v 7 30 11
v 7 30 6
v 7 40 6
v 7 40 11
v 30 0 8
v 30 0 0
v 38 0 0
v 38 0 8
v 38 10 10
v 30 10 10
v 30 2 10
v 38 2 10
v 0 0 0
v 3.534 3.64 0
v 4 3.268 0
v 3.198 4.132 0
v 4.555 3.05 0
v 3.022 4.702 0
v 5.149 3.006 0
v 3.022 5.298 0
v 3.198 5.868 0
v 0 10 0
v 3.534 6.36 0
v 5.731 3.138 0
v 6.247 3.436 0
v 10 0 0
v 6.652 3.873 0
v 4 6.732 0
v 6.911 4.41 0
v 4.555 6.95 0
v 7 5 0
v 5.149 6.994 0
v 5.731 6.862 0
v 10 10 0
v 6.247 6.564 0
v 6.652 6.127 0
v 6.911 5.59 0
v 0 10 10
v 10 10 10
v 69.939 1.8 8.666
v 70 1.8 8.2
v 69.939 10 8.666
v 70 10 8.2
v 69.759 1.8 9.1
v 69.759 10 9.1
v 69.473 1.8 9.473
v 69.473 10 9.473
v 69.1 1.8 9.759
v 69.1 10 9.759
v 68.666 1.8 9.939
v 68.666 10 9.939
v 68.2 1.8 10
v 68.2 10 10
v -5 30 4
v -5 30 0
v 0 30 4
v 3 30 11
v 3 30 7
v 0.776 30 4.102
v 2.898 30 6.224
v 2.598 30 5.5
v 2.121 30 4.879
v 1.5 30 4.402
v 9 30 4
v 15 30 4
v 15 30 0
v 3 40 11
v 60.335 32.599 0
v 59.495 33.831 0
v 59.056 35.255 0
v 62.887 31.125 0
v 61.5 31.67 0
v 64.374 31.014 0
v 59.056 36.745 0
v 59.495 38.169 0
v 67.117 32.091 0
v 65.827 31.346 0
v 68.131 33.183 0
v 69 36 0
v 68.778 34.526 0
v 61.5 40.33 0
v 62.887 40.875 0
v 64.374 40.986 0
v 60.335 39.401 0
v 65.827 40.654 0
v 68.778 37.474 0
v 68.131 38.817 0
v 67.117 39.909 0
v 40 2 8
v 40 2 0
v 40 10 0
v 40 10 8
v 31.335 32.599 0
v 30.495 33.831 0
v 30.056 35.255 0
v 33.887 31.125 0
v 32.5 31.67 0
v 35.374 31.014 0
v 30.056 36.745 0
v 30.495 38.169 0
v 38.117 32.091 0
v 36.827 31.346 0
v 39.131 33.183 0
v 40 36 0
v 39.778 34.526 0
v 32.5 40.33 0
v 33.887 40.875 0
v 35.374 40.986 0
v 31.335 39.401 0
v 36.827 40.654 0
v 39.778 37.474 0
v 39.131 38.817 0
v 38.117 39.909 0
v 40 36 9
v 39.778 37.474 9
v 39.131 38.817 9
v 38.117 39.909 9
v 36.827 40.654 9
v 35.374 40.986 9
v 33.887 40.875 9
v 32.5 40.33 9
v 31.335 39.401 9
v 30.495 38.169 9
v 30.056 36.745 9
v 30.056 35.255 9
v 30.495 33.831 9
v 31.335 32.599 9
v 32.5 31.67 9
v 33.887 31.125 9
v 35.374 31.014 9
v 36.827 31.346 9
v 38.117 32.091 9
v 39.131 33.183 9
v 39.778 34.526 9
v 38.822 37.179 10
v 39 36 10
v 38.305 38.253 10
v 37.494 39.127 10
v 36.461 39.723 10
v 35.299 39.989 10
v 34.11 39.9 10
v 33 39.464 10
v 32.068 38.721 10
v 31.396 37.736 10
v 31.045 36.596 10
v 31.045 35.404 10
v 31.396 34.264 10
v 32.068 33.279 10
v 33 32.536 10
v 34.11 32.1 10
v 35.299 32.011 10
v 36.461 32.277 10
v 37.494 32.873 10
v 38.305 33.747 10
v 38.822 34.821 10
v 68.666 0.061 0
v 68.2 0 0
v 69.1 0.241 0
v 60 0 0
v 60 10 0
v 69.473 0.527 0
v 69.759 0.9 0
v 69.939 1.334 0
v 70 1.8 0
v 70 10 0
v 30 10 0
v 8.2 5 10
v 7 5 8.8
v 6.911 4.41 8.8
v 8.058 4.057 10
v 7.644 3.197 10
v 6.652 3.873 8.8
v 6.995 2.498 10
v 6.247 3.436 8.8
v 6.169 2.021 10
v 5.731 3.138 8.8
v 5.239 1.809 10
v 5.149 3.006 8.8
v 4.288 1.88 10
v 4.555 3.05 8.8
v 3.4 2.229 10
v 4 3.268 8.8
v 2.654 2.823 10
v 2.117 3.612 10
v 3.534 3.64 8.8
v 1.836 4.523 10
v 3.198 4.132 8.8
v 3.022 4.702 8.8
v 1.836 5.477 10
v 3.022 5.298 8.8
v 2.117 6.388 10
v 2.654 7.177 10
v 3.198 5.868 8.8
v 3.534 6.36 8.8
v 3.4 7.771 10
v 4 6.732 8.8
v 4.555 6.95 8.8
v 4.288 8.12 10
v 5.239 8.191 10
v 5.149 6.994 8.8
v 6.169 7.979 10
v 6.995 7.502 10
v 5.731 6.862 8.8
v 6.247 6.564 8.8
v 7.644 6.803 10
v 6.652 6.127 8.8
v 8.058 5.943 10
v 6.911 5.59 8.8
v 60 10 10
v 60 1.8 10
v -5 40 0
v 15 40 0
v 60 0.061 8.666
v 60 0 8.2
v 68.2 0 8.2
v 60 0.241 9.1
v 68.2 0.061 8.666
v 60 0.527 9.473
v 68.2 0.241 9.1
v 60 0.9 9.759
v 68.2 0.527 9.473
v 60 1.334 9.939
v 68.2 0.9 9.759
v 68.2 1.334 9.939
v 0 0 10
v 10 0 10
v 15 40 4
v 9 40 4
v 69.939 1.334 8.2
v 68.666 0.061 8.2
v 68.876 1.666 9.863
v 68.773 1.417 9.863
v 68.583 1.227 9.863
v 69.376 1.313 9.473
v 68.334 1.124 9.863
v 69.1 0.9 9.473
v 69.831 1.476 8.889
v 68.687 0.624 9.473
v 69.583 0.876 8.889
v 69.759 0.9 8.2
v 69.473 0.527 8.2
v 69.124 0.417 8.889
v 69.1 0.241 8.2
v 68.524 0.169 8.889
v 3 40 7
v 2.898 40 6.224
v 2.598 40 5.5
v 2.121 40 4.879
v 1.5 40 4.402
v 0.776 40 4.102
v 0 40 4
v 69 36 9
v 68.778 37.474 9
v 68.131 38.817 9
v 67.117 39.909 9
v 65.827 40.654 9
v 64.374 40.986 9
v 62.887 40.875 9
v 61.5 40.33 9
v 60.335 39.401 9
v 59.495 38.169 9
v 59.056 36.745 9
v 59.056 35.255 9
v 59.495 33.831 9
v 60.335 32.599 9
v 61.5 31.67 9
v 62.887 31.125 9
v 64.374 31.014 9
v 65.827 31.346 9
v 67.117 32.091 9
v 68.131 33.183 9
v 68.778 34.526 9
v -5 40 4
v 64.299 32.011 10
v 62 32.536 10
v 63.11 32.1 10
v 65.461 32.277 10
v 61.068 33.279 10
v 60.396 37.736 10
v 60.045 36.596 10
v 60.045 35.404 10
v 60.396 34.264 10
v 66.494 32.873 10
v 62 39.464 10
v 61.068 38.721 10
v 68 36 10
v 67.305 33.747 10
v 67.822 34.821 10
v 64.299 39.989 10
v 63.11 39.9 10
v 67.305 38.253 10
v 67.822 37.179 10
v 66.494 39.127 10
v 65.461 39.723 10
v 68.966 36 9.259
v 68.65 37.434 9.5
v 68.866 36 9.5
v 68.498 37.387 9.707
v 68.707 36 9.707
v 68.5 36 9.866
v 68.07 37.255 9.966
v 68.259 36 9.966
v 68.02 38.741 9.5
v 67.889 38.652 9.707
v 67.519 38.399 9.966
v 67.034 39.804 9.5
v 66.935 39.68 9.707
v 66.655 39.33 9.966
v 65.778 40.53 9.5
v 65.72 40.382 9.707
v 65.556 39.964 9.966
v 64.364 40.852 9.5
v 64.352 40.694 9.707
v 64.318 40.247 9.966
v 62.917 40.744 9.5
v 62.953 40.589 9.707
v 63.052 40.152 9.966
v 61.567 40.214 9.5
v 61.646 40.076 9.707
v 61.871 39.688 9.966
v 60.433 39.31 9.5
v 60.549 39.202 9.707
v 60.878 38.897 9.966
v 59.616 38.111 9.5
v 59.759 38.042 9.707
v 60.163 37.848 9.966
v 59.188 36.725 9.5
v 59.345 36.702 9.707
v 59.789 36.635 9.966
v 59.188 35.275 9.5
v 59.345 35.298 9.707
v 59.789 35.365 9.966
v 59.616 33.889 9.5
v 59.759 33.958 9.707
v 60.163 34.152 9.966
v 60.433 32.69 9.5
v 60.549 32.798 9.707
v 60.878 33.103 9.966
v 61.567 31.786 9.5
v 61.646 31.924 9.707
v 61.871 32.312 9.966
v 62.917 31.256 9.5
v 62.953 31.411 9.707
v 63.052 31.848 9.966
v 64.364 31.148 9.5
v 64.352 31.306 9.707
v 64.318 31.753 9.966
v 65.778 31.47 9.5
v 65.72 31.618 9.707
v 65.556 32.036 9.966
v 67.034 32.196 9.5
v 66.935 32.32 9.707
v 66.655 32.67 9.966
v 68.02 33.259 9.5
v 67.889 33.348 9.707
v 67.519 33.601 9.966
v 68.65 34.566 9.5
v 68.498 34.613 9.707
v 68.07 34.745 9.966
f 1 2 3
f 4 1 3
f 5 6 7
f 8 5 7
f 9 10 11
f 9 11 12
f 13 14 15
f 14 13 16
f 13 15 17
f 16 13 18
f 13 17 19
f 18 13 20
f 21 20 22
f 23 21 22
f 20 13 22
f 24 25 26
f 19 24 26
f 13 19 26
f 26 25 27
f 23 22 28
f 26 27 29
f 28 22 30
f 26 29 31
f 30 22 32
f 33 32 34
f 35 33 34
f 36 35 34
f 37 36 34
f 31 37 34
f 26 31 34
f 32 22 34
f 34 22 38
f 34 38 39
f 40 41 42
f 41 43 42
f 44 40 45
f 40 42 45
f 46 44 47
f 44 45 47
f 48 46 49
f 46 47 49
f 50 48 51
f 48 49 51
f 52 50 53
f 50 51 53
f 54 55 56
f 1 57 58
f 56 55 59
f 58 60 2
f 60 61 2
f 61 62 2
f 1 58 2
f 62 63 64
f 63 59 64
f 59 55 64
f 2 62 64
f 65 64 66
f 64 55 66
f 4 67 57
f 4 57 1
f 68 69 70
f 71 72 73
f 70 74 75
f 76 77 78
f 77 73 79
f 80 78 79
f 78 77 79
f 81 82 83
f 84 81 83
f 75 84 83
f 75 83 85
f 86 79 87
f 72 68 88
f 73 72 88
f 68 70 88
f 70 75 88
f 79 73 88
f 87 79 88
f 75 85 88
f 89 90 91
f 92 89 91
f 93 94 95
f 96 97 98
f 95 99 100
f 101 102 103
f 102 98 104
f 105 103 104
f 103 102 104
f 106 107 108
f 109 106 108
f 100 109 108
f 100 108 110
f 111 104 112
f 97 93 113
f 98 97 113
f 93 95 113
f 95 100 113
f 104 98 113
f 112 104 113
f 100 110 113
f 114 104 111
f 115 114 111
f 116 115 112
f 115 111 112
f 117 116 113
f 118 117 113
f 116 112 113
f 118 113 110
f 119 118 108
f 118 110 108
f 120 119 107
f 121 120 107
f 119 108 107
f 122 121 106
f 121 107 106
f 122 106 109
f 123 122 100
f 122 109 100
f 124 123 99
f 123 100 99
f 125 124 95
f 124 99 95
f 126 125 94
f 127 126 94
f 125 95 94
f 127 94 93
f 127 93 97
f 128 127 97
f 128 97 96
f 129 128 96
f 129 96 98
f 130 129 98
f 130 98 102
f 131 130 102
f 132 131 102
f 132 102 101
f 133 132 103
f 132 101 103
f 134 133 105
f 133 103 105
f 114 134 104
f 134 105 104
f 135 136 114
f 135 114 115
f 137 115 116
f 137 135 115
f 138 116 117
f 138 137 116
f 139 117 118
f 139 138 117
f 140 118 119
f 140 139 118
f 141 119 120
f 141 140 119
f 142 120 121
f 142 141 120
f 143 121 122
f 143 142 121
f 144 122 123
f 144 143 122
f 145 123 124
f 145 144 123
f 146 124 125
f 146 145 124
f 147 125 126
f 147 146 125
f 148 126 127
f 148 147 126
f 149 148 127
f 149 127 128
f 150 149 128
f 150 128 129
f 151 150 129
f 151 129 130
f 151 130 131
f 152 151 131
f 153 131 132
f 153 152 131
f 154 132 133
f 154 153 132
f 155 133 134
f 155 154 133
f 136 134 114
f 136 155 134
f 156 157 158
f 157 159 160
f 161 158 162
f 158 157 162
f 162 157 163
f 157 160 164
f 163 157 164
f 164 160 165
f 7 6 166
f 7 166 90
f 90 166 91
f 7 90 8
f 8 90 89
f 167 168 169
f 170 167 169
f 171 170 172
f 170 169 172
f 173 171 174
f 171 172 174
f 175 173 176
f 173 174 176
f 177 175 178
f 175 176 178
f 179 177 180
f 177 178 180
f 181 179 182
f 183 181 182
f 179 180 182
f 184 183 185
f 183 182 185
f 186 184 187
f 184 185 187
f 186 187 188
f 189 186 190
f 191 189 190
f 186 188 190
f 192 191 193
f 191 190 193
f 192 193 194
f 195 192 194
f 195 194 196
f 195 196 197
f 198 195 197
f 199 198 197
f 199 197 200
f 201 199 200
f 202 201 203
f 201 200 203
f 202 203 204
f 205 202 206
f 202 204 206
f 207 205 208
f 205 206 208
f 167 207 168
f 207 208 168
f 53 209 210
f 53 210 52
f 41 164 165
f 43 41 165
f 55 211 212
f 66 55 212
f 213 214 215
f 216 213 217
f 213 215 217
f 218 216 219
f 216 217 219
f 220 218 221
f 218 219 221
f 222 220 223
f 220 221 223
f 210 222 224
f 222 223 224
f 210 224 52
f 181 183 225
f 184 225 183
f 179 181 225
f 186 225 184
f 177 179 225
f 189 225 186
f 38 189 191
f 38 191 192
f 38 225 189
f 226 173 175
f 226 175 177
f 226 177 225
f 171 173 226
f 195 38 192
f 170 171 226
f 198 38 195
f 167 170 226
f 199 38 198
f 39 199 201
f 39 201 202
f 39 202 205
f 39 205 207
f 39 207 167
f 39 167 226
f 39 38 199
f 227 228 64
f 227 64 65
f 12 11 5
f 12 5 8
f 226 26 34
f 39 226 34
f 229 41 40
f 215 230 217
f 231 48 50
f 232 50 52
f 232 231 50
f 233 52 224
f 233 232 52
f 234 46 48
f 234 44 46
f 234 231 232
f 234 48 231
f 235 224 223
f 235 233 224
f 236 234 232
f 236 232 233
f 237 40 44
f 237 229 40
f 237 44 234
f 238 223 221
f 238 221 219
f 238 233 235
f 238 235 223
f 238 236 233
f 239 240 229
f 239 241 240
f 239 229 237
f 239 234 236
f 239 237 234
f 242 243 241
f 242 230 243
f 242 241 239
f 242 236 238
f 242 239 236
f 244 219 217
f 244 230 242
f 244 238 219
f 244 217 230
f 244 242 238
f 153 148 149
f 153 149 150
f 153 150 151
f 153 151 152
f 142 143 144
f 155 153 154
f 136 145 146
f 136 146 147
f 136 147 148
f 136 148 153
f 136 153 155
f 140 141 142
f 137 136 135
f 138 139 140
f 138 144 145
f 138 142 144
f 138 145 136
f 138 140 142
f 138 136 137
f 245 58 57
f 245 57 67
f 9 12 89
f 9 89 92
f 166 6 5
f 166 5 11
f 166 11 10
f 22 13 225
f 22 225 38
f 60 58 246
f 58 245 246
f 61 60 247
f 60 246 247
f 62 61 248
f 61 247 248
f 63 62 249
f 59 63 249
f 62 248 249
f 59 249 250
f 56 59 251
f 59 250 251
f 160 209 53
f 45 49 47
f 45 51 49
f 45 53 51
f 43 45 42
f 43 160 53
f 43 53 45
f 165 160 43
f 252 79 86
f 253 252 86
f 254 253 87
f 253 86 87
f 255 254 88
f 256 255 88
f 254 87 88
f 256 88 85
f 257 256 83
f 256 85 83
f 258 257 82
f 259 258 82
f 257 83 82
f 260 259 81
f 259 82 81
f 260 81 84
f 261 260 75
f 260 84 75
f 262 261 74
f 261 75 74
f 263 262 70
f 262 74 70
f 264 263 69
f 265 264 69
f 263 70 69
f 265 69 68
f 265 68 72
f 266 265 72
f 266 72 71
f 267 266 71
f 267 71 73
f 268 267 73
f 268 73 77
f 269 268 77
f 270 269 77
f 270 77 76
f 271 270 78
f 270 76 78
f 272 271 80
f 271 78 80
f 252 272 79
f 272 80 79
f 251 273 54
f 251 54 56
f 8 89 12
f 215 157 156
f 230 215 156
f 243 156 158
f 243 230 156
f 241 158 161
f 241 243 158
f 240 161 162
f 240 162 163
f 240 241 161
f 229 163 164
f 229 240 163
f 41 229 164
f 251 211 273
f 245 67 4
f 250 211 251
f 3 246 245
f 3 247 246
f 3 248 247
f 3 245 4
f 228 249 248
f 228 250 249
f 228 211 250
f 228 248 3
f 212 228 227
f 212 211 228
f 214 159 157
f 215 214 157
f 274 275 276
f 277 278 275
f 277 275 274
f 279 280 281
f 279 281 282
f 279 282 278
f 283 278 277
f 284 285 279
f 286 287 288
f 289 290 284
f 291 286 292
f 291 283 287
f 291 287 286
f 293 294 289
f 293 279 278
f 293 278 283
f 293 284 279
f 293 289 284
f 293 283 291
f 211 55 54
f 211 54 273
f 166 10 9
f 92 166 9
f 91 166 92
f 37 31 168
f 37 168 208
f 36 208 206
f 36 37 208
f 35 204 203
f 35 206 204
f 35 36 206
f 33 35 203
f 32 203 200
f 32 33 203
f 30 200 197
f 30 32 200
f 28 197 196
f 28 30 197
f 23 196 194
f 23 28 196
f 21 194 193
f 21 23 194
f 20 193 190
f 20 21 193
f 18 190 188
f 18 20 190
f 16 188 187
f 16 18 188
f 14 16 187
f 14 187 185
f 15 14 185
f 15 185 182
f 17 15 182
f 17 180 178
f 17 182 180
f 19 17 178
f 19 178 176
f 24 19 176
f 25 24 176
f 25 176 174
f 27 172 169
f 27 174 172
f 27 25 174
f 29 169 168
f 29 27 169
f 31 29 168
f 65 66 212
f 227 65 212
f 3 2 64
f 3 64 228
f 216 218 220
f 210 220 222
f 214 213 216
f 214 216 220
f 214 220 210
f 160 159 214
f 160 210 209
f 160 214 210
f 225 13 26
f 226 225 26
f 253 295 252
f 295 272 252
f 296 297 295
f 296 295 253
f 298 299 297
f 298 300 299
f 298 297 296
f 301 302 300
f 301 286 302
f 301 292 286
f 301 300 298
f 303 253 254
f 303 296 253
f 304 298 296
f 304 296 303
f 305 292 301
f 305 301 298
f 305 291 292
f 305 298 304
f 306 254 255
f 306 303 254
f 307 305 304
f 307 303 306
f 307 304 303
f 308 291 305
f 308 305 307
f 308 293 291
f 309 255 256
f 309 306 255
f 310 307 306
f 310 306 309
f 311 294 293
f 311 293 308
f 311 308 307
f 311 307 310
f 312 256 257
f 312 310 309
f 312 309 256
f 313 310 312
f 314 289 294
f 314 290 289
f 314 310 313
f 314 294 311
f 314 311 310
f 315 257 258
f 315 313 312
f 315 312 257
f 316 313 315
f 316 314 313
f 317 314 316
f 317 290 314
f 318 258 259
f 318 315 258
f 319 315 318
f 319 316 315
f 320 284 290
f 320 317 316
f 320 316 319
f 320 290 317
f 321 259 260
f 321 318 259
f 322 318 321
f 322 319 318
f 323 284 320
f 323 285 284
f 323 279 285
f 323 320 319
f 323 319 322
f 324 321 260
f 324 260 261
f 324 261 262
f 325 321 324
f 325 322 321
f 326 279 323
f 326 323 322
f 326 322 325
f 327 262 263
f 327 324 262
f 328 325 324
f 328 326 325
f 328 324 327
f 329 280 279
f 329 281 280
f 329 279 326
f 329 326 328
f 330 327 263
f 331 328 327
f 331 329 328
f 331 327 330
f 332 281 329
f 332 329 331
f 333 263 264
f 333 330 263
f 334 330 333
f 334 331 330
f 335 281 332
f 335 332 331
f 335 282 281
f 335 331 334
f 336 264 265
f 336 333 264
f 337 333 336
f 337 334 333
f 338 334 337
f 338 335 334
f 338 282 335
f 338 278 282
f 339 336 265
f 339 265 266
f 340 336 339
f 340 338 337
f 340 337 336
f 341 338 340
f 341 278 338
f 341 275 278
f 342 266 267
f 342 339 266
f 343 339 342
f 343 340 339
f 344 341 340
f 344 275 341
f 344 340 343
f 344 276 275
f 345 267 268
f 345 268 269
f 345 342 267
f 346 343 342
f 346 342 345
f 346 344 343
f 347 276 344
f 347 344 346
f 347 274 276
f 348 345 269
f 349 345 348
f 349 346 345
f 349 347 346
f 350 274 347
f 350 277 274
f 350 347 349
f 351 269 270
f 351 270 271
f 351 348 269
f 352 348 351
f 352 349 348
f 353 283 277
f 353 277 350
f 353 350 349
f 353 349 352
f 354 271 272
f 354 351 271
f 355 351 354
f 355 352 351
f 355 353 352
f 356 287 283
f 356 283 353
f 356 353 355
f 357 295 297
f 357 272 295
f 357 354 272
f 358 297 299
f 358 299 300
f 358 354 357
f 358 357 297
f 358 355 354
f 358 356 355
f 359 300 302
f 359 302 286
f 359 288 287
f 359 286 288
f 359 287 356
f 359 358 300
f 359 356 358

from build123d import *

# Parameters (mm, degrees)
BOX002_W          = 10
BOX002_H          = 10
BOX002_DEPTH      = 10
FILLET_R          = 1.8
BOX001_W          = 10
BOX001_H          = 10
BOX001_DEPTH      = 10
CHAMFER_SIZE      = 2
CYLINDER_R        = 2
CYLINDER_DEPTH    = 12
BOX_W             = 10
BOX_H             = 10
BOX_DEPTH         = 10
CHAMFER001_SIZE   = 1.2
CYLINDER002_R     = 5
CYLINDER002_DEPTH = 10
FILLET001_R       = 1
CYLINDER001_R     = 5
CYLINDER001_DEPTH = 10
CHAMFER002_SIZE   = 1
BOX005_W          = 10
BOX005_H          = 10
BOX005_DEPTH      = 10
BOX004_W          = 10
BOX004_H          = 10
BOX004_DEPTH      = 10
BOX003_W          = 20
BOX003_H          = 10
BOX003_DEPTH      = 11
CHAMFER003_SIZE   = 2
FILLET002_R       = 3


with BuildPart() as fillet_body:
    # Box002 → Box002 (new body)
    with BuildSketch(Plane(origin=(60, 0, 0), x_dir=(1, 0, 0), z_dir=(0, 0, 1))):
        with Locations((5, 5)):
            Rectangle(BOX002_W, BOX002_H)
    extrude(amount=BOX002_DEPTH)

    # Fillet
    fillet_edges = [fillet_body.edges().sort_by_distance(p)[0] for p in [
        (70, 0, 5),
        (70, 5, 10),
        (65, 0, 10),
    ]]
    fillet(fillet_edges, radius=FILLET_R)


with BuildPart() as chamfer_body:
    # Box001 → Box001 (new body)
    with BuildSketch(Plane(origin=(30, 0, 0), x_dir=(1, 0, 0), z_dir=(0, 0, 1))):
        with Locations((5, 5)):
            Rectangle(BOX001_W, BOX001_H)
    extrude(amount=BOX001_DEPTH)

    # Chamfer
    chamfer_edges = [chamfer_body.edges().sort_by_distance(p)[0] for p in [
        (40, 0, 5),
        (40, 5, 10),
        (35, 0, 10),
    ]]
    chamfer(chamfer_edges, length=CHAMFER_SIZE)


with BuildPart() as cilindre:
    # Cylinder → Cylinder (new body)
    with BuildSketch(Plane(origin=(5, 5, -1), x_dir=(1, 0, 0), z_dir=(0, 0, 1))):
        Circle(CYLINDER_R)
    extrude(amount=CYLINDER_DEPTH)


with BuildPart() as chamfer001:
    # Box → Box (new body)
    with BuildSketch(Plane.XY):
        with Locations((5, 5)):
            Rectangle(BOX_W, BOX_H)
    extrude(amount=BOX_DEPTH)

    # Cut: cut Cilindre
    add(cilindre.part, mode=Mode.SUBTRACT)

    # Chamfer001
    chamfer001_edges = [chamfer001.edges().sort_by_distance(p)[0] for p in [
        (3, 5, 10),
    ]]
    chamfer(chamfer001_edges, length=CHAMFER001_SIZE)


with BuildPart() as fillet001:
    # Cylinder002 → Cylinder002 (new body)
    with BuildSketch(Plane(origin=(64, 36, 0), x_dir=(1, 0, 0), z_dir=(0, 0, 1))):
        Circle(CYLINDER002_R)
    extrude(amount=CYLINDER002_DEPTH)

    # Fillet001
    fillet001_edges = [fillet001.edges().sort_by_distance(p)[0] for p in [
        (59, 36, 10),
    ]]
    fillet(fillet001_edges, radius=FILLET001_R)


with BuildPart() as chamfer002:
    # Cylinder001 → Cylinder001 (new body)
    with BuildSketch(Plane(origin=(35, 36, 0), x_dir=(1, 0, 0), z_dir=(0, 0, 1))):
        Circle(CYLINDER001_R)
    extrude(amount=CYLINDER001_DEPTH)

    # Chamfer002
    chamfer002_edges = [chamfer002.edges().sort_by_distance(p)[0] for p in [
        (30, 36, 10),
    ]]
    chamfer(chamfer002_edges, length=CHAMFER002_SIZE)


with BuildPart() as cub005:
    # Box005 → Box005 (new body)
    with BuildSketch(Plane(origin=(7, 30, 4), x_dir=(1, 0, 0), z_dir=(0, 0, 1))):
        with Locations((5, 5)):
            Rectangle(BOX005_W, BOX005_H)
    extrude(amount=BOX005_DEPTH)


with BuildPart() as cub004:
    # Box004 → Box004 (new body)
    with BuildSketch(Plane(origin=(-7, 30, 4), x_dir=(1, 0, 0), z_dir=(0, 0, 1))):
        with Locations((5, 5)):
            Rectangle(BOX004_W, BOX004_H)
    extrude(amount=BOX004_DEPTH)


with BuildPart() as fillet002:
    # Box003 → Box003 (new body)
    with BuildSketch(Plane(origin=(-5, 30, 0), x_dir=(1, 0, 0), z_dir=(0, 0, 1))):
        with Locations((10, 5)):
            Rectangle(BOX003_W, BOX003_H)
    extrude(amount=BOX003_DEPTH)

    # Cut001: cut Cub004
    add(cub004.part, mode=Mode.SUBTRACT)

    # Cut002: cut Cub005
    add(cub005.part, mode=Mode.SUBTRACT)

    # Chamfer003
    chamfer003_edges = [fillet002.edges().sort_by_distance(p)[0] for p in [
        (7, 35, 4),
    ]]
    chamfer(chamfer003_edges, length=CHAMFER003_SIZE)

    # Fillet002
    fillet002_edges = [fillet002.edges().sort_by_distance(p)[0] for p in [
        (3, 35, 4),
    ]]
    fillet(fillet002_edges, radius=FILLET002_R)


solid = Compound([fillet_body.part, chamfer_body.part, chamfer001.part, fillet001.part, chamfer002.part, fillet002.part])
